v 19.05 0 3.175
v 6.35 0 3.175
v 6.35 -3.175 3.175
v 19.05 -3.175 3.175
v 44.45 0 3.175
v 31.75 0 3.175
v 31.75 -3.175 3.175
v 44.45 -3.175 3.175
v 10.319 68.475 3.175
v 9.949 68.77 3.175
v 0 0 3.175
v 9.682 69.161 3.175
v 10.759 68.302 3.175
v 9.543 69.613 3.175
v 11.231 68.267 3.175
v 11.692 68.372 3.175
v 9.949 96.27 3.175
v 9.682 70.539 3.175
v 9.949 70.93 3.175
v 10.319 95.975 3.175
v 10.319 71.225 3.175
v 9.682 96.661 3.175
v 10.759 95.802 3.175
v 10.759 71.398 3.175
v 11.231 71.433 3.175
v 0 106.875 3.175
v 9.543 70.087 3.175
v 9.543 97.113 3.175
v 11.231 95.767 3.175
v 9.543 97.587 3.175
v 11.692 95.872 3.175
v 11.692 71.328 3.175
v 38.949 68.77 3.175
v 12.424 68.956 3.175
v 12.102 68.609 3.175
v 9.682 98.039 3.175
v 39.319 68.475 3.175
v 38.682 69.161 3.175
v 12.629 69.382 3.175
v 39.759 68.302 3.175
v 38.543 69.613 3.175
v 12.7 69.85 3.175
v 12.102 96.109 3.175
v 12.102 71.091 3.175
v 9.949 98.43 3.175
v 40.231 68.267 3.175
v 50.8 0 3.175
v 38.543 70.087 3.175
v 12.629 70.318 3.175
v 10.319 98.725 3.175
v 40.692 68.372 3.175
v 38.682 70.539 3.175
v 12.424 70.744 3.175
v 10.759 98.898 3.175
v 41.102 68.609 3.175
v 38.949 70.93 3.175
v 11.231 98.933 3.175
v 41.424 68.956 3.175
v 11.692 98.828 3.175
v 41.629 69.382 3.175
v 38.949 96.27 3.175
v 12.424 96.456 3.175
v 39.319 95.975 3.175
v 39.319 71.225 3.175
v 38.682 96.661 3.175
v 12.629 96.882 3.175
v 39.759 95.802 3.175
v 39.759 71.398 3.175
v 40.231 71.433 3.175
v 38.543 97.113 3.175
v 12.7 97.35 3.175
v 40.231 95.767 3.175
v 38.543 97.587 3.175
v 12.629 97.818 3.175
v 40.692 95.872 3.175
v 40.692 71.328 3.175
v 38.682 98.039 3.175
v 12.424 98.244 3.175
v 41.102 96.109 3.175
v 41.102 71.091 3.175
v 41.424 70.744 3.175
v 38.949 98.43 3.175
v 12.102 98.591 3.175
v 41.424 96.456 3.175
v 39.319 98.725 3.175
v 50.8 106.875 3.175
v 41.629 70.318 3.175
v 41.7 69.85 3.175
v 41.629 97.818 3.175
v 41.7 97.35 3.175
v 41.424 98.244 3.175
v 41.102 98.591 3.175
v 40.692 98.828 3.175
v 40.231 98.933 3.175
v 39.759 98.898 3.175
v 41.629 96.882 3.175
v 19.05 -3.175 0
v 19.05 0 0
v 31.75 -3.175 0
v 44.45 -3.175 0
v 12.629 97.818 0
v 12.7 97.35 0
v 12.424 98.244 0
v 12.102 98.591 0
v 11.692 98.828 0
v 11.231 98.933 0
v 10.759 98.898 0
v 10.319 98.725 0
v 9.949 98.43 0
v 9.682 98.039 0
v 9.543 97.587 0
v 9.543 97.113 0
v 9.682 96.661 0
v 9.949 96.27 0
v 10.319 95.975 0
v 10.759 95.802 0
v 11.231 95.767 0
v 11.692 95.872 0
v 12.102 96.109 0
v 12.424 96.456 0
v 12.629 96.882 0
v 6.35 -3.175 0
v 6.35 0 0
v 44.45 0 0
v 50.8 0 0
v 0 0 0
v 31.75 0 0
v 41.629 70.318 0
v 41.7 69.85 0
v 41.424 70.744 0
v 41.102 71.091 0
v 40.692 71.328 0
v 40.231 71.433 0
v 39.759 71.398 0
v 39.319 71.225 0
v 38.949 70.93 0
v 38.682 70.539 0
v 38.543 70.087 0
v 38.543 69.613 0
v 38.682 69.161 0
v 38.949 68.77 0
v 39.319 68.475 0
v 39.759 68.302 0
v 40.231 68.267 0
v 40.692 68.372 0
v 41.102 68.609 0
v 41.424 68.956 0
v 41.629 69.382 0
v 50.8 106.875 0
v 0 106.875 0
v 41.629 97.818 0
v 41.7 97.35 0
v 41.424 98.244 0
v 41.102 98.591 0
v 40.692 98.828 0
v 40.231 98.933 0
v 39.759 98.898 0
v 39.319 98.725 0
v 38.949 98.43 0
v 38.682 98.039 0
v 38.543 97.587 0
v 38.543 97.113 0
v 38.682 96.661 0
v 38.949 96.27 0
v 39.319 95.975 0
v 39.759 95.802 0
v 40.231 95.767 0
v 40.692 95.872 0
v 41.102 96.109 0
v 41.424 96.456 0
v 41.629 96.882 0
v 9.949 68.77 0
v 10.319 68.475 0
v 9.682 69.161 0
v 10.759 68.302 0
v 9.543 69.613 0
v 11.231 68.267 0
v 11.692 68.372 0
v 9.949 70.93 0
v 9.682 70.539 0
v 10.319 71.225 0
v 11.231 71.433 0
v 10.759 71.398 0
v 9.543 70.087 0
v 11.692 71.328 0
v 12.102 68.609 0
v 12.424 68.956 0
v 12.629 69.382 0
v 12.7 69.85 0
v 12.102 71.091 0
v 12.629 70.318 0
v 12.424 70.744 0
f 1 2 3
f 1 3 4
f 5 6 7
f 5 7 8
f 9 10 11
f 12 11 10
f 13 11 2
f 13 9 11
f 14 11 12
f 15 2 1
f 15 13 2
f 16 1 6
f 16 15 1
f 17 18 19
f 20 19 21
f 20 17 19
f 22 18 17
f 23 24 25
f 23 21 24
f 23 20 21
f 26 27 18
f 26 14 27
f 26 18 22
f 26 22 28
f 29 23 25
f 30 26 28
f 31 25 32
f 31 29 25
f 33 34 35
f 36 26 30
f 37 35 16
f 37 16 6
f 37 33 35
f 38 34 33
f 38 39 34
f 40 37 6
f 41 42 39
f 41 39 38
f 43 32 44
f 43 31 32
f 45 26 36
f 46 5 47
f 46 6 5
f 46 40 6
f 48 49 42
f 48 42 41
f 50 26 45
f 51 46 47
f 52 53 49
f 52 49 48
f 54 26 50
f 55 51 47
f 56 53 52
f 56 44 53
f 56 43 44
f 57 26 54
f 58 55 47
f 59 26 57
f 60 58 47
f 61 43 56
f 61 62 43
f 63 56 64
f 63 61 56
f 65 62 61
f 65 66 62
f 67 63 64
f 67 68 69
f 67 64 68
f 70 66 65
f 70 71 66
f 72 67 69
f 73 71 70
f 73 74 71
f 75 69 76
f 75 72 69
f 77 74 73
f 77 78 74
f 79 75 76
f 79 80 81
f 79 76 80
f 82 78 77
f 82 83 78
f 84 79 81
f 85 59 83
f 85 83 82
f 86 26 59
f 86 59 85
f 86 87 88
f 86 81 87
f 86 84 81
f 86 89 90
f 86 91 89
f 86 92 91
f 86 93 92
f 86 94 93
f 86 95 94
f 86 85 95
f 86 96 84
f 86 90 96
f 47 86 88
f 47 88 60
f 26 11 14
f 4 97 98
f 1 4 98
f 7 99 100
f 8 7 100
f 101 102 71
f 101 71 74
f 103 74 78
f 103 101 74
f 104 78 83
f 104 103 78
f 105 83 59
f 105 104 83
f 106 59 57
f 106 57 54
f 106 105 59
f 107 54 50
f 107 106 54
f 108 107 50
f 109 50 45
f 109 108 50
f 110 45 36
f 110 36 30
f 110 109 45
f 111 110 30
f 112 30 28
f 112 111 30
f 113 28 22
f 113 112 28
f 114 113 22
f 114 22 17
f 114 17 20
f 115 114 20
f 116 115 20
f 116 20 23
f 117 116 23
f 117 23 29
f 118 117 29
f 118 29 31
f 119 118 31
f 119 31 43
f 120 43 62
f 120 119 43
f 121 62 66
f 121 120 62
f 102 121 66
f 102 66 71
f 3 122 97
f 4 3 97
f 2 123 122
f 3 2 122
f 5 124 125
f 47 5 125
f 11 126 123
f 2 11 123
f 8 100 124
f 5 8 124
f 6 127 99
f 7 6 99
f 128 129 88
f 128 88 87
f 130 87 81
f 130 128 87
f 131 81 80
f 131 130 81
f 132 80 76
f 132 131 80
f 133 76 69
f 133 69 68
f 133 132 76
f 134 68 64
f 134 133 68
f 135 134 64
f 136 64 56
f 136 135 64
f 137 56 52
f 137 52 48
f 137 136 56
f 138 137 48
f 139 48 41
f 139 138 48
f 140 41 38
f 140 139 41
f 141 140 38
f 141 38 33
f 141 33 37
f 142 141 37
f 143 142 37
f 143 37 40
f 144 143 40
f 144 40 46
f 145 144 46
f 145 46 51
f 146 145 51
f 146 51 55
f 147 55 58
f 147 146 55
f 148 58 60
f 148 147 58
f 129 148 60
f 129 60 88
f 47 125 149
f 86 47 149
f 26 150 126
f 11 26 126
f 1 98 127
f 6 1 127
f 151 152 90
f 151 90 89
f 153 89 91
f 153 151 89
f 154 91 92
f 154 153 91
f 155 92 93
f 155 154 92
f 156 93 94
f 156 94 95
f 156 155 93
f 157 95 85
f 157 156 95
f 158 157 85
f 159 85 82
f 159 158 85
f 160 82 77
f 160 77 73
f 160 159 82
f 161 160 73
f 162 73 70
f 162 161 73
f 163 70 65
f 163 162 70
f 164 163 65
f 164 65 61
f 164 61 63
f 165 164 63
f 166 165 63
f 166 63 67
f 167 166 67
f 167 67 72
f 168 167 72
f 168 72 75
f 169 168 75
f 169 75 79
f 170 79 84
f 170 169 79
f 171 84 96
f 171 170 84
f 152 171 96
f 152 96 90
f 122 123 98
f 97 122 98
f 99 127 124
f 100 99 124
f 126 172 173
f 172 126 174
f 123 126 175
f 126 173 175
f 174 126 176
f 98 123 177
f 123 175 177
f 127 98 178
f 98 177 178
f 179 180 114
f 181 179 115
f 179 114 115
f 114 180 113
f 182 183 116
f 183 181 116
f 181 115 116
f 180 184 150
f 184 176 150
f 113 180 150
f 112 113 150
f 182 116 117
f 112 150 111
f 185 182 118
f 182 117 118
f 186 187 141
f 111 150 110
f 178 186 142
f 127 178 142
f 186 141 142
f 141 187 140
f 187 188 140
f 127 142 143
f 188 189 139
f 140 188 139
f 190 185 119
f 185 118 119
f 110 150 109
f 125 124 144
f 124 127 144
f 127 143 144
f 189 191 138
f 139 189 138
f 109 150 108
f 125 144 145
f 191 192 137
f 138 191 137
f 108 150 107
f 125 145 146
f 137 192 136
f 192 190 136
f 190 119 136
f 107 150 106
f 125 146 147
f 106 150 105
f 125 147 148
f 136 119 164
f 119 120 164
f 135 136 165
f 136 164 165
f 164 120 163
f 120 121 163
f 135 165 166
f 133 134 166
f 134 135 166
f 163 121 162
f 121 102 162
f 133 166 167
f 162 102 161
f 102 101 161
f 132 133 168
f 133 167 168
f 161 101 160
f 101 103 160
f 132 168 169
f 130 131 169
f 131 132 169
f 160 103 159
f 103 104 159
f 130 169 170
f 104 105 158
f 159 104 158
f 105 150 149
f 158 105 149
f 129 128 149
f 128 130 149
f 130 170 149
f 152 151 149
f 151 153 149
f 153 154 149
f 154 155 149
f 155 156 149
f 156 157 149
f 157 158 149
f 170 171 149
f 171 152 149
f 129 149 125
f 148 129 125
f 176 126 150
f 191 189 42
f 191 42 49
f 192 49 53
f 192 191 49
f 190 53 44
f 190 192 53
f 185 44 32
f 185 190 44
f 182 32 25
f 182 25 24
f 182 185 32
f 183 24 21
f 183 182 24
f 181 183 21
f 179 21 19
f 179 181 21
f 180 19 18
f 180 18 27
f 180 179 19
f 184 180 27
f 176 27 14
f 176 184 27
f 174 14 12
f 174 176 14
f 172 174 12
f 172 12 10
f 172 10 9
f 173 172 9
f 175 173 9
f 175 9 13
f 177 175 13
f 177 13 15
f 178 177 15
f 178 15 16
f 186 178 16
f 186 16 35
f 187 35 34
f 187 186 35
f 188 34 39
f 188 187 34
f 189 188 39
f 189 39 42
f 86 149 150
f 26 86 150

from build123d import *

# Parameters (mm, degrees)
SKETCH1_R           = 1.5875
BOSS_EXTRUDE1_DEPTH = 3.175


with BuildPart() as part:
    # Sketch1 → Boss-Extrude1 (new body)
    with BuildSketch(Plane.XY):
        Polygon((50.8, 106.875), (11.1125, 106.875), (0, 106.875), (0, 0), (6.35, 0), (6.35, -3.175), (19.05, -3.175), (19.05, 0), (31.75, 0), (31.75, -3.175), (44.45, -3.175), (44.45, 0), (50.8, 0), align=None)
        with BuildLine():
            ThreePointArc((11.1125, 68.2625), (9.525, 69.85), (11.1125, 71.4375))
            ThreePointArc((11.1125, 71.4375), (12.235032015, 70.972532015), (12.7, 69.85))
            ThreePointArc((12.7, 69.85), (12.235032015, 68.727467985), (11.1125, 68.2625))
        make_face(mode=Mode.SUBTRACT)
        with BuildLine():
            ThreePointArc((11.1125, 95.7625), (9.525, 97.35), (11.1125, 98.9375))
            ThreePointArc((11.1125, 98.9375), (12.235032015, 98.472532015), (12.7, 97.35))
            ThreePointArc((12.7, 97.35), (12.235032015, 96.227467985), (11.1125, 95.7625))
        make_face(mode=Mode.SUBTRACT)
        with Locations((40.1125, 69.85)):
            Circle(SKETCH1_R, mode=Mode.SUBTRACT)
        with Locations((40.1125, 97.35)):
            Circle(SKETCH1_R, mode=Mode.SUBTRACT)
    extrude(amount=BOSS_EXTRUDE1_DEPTH)


solid = part.part
